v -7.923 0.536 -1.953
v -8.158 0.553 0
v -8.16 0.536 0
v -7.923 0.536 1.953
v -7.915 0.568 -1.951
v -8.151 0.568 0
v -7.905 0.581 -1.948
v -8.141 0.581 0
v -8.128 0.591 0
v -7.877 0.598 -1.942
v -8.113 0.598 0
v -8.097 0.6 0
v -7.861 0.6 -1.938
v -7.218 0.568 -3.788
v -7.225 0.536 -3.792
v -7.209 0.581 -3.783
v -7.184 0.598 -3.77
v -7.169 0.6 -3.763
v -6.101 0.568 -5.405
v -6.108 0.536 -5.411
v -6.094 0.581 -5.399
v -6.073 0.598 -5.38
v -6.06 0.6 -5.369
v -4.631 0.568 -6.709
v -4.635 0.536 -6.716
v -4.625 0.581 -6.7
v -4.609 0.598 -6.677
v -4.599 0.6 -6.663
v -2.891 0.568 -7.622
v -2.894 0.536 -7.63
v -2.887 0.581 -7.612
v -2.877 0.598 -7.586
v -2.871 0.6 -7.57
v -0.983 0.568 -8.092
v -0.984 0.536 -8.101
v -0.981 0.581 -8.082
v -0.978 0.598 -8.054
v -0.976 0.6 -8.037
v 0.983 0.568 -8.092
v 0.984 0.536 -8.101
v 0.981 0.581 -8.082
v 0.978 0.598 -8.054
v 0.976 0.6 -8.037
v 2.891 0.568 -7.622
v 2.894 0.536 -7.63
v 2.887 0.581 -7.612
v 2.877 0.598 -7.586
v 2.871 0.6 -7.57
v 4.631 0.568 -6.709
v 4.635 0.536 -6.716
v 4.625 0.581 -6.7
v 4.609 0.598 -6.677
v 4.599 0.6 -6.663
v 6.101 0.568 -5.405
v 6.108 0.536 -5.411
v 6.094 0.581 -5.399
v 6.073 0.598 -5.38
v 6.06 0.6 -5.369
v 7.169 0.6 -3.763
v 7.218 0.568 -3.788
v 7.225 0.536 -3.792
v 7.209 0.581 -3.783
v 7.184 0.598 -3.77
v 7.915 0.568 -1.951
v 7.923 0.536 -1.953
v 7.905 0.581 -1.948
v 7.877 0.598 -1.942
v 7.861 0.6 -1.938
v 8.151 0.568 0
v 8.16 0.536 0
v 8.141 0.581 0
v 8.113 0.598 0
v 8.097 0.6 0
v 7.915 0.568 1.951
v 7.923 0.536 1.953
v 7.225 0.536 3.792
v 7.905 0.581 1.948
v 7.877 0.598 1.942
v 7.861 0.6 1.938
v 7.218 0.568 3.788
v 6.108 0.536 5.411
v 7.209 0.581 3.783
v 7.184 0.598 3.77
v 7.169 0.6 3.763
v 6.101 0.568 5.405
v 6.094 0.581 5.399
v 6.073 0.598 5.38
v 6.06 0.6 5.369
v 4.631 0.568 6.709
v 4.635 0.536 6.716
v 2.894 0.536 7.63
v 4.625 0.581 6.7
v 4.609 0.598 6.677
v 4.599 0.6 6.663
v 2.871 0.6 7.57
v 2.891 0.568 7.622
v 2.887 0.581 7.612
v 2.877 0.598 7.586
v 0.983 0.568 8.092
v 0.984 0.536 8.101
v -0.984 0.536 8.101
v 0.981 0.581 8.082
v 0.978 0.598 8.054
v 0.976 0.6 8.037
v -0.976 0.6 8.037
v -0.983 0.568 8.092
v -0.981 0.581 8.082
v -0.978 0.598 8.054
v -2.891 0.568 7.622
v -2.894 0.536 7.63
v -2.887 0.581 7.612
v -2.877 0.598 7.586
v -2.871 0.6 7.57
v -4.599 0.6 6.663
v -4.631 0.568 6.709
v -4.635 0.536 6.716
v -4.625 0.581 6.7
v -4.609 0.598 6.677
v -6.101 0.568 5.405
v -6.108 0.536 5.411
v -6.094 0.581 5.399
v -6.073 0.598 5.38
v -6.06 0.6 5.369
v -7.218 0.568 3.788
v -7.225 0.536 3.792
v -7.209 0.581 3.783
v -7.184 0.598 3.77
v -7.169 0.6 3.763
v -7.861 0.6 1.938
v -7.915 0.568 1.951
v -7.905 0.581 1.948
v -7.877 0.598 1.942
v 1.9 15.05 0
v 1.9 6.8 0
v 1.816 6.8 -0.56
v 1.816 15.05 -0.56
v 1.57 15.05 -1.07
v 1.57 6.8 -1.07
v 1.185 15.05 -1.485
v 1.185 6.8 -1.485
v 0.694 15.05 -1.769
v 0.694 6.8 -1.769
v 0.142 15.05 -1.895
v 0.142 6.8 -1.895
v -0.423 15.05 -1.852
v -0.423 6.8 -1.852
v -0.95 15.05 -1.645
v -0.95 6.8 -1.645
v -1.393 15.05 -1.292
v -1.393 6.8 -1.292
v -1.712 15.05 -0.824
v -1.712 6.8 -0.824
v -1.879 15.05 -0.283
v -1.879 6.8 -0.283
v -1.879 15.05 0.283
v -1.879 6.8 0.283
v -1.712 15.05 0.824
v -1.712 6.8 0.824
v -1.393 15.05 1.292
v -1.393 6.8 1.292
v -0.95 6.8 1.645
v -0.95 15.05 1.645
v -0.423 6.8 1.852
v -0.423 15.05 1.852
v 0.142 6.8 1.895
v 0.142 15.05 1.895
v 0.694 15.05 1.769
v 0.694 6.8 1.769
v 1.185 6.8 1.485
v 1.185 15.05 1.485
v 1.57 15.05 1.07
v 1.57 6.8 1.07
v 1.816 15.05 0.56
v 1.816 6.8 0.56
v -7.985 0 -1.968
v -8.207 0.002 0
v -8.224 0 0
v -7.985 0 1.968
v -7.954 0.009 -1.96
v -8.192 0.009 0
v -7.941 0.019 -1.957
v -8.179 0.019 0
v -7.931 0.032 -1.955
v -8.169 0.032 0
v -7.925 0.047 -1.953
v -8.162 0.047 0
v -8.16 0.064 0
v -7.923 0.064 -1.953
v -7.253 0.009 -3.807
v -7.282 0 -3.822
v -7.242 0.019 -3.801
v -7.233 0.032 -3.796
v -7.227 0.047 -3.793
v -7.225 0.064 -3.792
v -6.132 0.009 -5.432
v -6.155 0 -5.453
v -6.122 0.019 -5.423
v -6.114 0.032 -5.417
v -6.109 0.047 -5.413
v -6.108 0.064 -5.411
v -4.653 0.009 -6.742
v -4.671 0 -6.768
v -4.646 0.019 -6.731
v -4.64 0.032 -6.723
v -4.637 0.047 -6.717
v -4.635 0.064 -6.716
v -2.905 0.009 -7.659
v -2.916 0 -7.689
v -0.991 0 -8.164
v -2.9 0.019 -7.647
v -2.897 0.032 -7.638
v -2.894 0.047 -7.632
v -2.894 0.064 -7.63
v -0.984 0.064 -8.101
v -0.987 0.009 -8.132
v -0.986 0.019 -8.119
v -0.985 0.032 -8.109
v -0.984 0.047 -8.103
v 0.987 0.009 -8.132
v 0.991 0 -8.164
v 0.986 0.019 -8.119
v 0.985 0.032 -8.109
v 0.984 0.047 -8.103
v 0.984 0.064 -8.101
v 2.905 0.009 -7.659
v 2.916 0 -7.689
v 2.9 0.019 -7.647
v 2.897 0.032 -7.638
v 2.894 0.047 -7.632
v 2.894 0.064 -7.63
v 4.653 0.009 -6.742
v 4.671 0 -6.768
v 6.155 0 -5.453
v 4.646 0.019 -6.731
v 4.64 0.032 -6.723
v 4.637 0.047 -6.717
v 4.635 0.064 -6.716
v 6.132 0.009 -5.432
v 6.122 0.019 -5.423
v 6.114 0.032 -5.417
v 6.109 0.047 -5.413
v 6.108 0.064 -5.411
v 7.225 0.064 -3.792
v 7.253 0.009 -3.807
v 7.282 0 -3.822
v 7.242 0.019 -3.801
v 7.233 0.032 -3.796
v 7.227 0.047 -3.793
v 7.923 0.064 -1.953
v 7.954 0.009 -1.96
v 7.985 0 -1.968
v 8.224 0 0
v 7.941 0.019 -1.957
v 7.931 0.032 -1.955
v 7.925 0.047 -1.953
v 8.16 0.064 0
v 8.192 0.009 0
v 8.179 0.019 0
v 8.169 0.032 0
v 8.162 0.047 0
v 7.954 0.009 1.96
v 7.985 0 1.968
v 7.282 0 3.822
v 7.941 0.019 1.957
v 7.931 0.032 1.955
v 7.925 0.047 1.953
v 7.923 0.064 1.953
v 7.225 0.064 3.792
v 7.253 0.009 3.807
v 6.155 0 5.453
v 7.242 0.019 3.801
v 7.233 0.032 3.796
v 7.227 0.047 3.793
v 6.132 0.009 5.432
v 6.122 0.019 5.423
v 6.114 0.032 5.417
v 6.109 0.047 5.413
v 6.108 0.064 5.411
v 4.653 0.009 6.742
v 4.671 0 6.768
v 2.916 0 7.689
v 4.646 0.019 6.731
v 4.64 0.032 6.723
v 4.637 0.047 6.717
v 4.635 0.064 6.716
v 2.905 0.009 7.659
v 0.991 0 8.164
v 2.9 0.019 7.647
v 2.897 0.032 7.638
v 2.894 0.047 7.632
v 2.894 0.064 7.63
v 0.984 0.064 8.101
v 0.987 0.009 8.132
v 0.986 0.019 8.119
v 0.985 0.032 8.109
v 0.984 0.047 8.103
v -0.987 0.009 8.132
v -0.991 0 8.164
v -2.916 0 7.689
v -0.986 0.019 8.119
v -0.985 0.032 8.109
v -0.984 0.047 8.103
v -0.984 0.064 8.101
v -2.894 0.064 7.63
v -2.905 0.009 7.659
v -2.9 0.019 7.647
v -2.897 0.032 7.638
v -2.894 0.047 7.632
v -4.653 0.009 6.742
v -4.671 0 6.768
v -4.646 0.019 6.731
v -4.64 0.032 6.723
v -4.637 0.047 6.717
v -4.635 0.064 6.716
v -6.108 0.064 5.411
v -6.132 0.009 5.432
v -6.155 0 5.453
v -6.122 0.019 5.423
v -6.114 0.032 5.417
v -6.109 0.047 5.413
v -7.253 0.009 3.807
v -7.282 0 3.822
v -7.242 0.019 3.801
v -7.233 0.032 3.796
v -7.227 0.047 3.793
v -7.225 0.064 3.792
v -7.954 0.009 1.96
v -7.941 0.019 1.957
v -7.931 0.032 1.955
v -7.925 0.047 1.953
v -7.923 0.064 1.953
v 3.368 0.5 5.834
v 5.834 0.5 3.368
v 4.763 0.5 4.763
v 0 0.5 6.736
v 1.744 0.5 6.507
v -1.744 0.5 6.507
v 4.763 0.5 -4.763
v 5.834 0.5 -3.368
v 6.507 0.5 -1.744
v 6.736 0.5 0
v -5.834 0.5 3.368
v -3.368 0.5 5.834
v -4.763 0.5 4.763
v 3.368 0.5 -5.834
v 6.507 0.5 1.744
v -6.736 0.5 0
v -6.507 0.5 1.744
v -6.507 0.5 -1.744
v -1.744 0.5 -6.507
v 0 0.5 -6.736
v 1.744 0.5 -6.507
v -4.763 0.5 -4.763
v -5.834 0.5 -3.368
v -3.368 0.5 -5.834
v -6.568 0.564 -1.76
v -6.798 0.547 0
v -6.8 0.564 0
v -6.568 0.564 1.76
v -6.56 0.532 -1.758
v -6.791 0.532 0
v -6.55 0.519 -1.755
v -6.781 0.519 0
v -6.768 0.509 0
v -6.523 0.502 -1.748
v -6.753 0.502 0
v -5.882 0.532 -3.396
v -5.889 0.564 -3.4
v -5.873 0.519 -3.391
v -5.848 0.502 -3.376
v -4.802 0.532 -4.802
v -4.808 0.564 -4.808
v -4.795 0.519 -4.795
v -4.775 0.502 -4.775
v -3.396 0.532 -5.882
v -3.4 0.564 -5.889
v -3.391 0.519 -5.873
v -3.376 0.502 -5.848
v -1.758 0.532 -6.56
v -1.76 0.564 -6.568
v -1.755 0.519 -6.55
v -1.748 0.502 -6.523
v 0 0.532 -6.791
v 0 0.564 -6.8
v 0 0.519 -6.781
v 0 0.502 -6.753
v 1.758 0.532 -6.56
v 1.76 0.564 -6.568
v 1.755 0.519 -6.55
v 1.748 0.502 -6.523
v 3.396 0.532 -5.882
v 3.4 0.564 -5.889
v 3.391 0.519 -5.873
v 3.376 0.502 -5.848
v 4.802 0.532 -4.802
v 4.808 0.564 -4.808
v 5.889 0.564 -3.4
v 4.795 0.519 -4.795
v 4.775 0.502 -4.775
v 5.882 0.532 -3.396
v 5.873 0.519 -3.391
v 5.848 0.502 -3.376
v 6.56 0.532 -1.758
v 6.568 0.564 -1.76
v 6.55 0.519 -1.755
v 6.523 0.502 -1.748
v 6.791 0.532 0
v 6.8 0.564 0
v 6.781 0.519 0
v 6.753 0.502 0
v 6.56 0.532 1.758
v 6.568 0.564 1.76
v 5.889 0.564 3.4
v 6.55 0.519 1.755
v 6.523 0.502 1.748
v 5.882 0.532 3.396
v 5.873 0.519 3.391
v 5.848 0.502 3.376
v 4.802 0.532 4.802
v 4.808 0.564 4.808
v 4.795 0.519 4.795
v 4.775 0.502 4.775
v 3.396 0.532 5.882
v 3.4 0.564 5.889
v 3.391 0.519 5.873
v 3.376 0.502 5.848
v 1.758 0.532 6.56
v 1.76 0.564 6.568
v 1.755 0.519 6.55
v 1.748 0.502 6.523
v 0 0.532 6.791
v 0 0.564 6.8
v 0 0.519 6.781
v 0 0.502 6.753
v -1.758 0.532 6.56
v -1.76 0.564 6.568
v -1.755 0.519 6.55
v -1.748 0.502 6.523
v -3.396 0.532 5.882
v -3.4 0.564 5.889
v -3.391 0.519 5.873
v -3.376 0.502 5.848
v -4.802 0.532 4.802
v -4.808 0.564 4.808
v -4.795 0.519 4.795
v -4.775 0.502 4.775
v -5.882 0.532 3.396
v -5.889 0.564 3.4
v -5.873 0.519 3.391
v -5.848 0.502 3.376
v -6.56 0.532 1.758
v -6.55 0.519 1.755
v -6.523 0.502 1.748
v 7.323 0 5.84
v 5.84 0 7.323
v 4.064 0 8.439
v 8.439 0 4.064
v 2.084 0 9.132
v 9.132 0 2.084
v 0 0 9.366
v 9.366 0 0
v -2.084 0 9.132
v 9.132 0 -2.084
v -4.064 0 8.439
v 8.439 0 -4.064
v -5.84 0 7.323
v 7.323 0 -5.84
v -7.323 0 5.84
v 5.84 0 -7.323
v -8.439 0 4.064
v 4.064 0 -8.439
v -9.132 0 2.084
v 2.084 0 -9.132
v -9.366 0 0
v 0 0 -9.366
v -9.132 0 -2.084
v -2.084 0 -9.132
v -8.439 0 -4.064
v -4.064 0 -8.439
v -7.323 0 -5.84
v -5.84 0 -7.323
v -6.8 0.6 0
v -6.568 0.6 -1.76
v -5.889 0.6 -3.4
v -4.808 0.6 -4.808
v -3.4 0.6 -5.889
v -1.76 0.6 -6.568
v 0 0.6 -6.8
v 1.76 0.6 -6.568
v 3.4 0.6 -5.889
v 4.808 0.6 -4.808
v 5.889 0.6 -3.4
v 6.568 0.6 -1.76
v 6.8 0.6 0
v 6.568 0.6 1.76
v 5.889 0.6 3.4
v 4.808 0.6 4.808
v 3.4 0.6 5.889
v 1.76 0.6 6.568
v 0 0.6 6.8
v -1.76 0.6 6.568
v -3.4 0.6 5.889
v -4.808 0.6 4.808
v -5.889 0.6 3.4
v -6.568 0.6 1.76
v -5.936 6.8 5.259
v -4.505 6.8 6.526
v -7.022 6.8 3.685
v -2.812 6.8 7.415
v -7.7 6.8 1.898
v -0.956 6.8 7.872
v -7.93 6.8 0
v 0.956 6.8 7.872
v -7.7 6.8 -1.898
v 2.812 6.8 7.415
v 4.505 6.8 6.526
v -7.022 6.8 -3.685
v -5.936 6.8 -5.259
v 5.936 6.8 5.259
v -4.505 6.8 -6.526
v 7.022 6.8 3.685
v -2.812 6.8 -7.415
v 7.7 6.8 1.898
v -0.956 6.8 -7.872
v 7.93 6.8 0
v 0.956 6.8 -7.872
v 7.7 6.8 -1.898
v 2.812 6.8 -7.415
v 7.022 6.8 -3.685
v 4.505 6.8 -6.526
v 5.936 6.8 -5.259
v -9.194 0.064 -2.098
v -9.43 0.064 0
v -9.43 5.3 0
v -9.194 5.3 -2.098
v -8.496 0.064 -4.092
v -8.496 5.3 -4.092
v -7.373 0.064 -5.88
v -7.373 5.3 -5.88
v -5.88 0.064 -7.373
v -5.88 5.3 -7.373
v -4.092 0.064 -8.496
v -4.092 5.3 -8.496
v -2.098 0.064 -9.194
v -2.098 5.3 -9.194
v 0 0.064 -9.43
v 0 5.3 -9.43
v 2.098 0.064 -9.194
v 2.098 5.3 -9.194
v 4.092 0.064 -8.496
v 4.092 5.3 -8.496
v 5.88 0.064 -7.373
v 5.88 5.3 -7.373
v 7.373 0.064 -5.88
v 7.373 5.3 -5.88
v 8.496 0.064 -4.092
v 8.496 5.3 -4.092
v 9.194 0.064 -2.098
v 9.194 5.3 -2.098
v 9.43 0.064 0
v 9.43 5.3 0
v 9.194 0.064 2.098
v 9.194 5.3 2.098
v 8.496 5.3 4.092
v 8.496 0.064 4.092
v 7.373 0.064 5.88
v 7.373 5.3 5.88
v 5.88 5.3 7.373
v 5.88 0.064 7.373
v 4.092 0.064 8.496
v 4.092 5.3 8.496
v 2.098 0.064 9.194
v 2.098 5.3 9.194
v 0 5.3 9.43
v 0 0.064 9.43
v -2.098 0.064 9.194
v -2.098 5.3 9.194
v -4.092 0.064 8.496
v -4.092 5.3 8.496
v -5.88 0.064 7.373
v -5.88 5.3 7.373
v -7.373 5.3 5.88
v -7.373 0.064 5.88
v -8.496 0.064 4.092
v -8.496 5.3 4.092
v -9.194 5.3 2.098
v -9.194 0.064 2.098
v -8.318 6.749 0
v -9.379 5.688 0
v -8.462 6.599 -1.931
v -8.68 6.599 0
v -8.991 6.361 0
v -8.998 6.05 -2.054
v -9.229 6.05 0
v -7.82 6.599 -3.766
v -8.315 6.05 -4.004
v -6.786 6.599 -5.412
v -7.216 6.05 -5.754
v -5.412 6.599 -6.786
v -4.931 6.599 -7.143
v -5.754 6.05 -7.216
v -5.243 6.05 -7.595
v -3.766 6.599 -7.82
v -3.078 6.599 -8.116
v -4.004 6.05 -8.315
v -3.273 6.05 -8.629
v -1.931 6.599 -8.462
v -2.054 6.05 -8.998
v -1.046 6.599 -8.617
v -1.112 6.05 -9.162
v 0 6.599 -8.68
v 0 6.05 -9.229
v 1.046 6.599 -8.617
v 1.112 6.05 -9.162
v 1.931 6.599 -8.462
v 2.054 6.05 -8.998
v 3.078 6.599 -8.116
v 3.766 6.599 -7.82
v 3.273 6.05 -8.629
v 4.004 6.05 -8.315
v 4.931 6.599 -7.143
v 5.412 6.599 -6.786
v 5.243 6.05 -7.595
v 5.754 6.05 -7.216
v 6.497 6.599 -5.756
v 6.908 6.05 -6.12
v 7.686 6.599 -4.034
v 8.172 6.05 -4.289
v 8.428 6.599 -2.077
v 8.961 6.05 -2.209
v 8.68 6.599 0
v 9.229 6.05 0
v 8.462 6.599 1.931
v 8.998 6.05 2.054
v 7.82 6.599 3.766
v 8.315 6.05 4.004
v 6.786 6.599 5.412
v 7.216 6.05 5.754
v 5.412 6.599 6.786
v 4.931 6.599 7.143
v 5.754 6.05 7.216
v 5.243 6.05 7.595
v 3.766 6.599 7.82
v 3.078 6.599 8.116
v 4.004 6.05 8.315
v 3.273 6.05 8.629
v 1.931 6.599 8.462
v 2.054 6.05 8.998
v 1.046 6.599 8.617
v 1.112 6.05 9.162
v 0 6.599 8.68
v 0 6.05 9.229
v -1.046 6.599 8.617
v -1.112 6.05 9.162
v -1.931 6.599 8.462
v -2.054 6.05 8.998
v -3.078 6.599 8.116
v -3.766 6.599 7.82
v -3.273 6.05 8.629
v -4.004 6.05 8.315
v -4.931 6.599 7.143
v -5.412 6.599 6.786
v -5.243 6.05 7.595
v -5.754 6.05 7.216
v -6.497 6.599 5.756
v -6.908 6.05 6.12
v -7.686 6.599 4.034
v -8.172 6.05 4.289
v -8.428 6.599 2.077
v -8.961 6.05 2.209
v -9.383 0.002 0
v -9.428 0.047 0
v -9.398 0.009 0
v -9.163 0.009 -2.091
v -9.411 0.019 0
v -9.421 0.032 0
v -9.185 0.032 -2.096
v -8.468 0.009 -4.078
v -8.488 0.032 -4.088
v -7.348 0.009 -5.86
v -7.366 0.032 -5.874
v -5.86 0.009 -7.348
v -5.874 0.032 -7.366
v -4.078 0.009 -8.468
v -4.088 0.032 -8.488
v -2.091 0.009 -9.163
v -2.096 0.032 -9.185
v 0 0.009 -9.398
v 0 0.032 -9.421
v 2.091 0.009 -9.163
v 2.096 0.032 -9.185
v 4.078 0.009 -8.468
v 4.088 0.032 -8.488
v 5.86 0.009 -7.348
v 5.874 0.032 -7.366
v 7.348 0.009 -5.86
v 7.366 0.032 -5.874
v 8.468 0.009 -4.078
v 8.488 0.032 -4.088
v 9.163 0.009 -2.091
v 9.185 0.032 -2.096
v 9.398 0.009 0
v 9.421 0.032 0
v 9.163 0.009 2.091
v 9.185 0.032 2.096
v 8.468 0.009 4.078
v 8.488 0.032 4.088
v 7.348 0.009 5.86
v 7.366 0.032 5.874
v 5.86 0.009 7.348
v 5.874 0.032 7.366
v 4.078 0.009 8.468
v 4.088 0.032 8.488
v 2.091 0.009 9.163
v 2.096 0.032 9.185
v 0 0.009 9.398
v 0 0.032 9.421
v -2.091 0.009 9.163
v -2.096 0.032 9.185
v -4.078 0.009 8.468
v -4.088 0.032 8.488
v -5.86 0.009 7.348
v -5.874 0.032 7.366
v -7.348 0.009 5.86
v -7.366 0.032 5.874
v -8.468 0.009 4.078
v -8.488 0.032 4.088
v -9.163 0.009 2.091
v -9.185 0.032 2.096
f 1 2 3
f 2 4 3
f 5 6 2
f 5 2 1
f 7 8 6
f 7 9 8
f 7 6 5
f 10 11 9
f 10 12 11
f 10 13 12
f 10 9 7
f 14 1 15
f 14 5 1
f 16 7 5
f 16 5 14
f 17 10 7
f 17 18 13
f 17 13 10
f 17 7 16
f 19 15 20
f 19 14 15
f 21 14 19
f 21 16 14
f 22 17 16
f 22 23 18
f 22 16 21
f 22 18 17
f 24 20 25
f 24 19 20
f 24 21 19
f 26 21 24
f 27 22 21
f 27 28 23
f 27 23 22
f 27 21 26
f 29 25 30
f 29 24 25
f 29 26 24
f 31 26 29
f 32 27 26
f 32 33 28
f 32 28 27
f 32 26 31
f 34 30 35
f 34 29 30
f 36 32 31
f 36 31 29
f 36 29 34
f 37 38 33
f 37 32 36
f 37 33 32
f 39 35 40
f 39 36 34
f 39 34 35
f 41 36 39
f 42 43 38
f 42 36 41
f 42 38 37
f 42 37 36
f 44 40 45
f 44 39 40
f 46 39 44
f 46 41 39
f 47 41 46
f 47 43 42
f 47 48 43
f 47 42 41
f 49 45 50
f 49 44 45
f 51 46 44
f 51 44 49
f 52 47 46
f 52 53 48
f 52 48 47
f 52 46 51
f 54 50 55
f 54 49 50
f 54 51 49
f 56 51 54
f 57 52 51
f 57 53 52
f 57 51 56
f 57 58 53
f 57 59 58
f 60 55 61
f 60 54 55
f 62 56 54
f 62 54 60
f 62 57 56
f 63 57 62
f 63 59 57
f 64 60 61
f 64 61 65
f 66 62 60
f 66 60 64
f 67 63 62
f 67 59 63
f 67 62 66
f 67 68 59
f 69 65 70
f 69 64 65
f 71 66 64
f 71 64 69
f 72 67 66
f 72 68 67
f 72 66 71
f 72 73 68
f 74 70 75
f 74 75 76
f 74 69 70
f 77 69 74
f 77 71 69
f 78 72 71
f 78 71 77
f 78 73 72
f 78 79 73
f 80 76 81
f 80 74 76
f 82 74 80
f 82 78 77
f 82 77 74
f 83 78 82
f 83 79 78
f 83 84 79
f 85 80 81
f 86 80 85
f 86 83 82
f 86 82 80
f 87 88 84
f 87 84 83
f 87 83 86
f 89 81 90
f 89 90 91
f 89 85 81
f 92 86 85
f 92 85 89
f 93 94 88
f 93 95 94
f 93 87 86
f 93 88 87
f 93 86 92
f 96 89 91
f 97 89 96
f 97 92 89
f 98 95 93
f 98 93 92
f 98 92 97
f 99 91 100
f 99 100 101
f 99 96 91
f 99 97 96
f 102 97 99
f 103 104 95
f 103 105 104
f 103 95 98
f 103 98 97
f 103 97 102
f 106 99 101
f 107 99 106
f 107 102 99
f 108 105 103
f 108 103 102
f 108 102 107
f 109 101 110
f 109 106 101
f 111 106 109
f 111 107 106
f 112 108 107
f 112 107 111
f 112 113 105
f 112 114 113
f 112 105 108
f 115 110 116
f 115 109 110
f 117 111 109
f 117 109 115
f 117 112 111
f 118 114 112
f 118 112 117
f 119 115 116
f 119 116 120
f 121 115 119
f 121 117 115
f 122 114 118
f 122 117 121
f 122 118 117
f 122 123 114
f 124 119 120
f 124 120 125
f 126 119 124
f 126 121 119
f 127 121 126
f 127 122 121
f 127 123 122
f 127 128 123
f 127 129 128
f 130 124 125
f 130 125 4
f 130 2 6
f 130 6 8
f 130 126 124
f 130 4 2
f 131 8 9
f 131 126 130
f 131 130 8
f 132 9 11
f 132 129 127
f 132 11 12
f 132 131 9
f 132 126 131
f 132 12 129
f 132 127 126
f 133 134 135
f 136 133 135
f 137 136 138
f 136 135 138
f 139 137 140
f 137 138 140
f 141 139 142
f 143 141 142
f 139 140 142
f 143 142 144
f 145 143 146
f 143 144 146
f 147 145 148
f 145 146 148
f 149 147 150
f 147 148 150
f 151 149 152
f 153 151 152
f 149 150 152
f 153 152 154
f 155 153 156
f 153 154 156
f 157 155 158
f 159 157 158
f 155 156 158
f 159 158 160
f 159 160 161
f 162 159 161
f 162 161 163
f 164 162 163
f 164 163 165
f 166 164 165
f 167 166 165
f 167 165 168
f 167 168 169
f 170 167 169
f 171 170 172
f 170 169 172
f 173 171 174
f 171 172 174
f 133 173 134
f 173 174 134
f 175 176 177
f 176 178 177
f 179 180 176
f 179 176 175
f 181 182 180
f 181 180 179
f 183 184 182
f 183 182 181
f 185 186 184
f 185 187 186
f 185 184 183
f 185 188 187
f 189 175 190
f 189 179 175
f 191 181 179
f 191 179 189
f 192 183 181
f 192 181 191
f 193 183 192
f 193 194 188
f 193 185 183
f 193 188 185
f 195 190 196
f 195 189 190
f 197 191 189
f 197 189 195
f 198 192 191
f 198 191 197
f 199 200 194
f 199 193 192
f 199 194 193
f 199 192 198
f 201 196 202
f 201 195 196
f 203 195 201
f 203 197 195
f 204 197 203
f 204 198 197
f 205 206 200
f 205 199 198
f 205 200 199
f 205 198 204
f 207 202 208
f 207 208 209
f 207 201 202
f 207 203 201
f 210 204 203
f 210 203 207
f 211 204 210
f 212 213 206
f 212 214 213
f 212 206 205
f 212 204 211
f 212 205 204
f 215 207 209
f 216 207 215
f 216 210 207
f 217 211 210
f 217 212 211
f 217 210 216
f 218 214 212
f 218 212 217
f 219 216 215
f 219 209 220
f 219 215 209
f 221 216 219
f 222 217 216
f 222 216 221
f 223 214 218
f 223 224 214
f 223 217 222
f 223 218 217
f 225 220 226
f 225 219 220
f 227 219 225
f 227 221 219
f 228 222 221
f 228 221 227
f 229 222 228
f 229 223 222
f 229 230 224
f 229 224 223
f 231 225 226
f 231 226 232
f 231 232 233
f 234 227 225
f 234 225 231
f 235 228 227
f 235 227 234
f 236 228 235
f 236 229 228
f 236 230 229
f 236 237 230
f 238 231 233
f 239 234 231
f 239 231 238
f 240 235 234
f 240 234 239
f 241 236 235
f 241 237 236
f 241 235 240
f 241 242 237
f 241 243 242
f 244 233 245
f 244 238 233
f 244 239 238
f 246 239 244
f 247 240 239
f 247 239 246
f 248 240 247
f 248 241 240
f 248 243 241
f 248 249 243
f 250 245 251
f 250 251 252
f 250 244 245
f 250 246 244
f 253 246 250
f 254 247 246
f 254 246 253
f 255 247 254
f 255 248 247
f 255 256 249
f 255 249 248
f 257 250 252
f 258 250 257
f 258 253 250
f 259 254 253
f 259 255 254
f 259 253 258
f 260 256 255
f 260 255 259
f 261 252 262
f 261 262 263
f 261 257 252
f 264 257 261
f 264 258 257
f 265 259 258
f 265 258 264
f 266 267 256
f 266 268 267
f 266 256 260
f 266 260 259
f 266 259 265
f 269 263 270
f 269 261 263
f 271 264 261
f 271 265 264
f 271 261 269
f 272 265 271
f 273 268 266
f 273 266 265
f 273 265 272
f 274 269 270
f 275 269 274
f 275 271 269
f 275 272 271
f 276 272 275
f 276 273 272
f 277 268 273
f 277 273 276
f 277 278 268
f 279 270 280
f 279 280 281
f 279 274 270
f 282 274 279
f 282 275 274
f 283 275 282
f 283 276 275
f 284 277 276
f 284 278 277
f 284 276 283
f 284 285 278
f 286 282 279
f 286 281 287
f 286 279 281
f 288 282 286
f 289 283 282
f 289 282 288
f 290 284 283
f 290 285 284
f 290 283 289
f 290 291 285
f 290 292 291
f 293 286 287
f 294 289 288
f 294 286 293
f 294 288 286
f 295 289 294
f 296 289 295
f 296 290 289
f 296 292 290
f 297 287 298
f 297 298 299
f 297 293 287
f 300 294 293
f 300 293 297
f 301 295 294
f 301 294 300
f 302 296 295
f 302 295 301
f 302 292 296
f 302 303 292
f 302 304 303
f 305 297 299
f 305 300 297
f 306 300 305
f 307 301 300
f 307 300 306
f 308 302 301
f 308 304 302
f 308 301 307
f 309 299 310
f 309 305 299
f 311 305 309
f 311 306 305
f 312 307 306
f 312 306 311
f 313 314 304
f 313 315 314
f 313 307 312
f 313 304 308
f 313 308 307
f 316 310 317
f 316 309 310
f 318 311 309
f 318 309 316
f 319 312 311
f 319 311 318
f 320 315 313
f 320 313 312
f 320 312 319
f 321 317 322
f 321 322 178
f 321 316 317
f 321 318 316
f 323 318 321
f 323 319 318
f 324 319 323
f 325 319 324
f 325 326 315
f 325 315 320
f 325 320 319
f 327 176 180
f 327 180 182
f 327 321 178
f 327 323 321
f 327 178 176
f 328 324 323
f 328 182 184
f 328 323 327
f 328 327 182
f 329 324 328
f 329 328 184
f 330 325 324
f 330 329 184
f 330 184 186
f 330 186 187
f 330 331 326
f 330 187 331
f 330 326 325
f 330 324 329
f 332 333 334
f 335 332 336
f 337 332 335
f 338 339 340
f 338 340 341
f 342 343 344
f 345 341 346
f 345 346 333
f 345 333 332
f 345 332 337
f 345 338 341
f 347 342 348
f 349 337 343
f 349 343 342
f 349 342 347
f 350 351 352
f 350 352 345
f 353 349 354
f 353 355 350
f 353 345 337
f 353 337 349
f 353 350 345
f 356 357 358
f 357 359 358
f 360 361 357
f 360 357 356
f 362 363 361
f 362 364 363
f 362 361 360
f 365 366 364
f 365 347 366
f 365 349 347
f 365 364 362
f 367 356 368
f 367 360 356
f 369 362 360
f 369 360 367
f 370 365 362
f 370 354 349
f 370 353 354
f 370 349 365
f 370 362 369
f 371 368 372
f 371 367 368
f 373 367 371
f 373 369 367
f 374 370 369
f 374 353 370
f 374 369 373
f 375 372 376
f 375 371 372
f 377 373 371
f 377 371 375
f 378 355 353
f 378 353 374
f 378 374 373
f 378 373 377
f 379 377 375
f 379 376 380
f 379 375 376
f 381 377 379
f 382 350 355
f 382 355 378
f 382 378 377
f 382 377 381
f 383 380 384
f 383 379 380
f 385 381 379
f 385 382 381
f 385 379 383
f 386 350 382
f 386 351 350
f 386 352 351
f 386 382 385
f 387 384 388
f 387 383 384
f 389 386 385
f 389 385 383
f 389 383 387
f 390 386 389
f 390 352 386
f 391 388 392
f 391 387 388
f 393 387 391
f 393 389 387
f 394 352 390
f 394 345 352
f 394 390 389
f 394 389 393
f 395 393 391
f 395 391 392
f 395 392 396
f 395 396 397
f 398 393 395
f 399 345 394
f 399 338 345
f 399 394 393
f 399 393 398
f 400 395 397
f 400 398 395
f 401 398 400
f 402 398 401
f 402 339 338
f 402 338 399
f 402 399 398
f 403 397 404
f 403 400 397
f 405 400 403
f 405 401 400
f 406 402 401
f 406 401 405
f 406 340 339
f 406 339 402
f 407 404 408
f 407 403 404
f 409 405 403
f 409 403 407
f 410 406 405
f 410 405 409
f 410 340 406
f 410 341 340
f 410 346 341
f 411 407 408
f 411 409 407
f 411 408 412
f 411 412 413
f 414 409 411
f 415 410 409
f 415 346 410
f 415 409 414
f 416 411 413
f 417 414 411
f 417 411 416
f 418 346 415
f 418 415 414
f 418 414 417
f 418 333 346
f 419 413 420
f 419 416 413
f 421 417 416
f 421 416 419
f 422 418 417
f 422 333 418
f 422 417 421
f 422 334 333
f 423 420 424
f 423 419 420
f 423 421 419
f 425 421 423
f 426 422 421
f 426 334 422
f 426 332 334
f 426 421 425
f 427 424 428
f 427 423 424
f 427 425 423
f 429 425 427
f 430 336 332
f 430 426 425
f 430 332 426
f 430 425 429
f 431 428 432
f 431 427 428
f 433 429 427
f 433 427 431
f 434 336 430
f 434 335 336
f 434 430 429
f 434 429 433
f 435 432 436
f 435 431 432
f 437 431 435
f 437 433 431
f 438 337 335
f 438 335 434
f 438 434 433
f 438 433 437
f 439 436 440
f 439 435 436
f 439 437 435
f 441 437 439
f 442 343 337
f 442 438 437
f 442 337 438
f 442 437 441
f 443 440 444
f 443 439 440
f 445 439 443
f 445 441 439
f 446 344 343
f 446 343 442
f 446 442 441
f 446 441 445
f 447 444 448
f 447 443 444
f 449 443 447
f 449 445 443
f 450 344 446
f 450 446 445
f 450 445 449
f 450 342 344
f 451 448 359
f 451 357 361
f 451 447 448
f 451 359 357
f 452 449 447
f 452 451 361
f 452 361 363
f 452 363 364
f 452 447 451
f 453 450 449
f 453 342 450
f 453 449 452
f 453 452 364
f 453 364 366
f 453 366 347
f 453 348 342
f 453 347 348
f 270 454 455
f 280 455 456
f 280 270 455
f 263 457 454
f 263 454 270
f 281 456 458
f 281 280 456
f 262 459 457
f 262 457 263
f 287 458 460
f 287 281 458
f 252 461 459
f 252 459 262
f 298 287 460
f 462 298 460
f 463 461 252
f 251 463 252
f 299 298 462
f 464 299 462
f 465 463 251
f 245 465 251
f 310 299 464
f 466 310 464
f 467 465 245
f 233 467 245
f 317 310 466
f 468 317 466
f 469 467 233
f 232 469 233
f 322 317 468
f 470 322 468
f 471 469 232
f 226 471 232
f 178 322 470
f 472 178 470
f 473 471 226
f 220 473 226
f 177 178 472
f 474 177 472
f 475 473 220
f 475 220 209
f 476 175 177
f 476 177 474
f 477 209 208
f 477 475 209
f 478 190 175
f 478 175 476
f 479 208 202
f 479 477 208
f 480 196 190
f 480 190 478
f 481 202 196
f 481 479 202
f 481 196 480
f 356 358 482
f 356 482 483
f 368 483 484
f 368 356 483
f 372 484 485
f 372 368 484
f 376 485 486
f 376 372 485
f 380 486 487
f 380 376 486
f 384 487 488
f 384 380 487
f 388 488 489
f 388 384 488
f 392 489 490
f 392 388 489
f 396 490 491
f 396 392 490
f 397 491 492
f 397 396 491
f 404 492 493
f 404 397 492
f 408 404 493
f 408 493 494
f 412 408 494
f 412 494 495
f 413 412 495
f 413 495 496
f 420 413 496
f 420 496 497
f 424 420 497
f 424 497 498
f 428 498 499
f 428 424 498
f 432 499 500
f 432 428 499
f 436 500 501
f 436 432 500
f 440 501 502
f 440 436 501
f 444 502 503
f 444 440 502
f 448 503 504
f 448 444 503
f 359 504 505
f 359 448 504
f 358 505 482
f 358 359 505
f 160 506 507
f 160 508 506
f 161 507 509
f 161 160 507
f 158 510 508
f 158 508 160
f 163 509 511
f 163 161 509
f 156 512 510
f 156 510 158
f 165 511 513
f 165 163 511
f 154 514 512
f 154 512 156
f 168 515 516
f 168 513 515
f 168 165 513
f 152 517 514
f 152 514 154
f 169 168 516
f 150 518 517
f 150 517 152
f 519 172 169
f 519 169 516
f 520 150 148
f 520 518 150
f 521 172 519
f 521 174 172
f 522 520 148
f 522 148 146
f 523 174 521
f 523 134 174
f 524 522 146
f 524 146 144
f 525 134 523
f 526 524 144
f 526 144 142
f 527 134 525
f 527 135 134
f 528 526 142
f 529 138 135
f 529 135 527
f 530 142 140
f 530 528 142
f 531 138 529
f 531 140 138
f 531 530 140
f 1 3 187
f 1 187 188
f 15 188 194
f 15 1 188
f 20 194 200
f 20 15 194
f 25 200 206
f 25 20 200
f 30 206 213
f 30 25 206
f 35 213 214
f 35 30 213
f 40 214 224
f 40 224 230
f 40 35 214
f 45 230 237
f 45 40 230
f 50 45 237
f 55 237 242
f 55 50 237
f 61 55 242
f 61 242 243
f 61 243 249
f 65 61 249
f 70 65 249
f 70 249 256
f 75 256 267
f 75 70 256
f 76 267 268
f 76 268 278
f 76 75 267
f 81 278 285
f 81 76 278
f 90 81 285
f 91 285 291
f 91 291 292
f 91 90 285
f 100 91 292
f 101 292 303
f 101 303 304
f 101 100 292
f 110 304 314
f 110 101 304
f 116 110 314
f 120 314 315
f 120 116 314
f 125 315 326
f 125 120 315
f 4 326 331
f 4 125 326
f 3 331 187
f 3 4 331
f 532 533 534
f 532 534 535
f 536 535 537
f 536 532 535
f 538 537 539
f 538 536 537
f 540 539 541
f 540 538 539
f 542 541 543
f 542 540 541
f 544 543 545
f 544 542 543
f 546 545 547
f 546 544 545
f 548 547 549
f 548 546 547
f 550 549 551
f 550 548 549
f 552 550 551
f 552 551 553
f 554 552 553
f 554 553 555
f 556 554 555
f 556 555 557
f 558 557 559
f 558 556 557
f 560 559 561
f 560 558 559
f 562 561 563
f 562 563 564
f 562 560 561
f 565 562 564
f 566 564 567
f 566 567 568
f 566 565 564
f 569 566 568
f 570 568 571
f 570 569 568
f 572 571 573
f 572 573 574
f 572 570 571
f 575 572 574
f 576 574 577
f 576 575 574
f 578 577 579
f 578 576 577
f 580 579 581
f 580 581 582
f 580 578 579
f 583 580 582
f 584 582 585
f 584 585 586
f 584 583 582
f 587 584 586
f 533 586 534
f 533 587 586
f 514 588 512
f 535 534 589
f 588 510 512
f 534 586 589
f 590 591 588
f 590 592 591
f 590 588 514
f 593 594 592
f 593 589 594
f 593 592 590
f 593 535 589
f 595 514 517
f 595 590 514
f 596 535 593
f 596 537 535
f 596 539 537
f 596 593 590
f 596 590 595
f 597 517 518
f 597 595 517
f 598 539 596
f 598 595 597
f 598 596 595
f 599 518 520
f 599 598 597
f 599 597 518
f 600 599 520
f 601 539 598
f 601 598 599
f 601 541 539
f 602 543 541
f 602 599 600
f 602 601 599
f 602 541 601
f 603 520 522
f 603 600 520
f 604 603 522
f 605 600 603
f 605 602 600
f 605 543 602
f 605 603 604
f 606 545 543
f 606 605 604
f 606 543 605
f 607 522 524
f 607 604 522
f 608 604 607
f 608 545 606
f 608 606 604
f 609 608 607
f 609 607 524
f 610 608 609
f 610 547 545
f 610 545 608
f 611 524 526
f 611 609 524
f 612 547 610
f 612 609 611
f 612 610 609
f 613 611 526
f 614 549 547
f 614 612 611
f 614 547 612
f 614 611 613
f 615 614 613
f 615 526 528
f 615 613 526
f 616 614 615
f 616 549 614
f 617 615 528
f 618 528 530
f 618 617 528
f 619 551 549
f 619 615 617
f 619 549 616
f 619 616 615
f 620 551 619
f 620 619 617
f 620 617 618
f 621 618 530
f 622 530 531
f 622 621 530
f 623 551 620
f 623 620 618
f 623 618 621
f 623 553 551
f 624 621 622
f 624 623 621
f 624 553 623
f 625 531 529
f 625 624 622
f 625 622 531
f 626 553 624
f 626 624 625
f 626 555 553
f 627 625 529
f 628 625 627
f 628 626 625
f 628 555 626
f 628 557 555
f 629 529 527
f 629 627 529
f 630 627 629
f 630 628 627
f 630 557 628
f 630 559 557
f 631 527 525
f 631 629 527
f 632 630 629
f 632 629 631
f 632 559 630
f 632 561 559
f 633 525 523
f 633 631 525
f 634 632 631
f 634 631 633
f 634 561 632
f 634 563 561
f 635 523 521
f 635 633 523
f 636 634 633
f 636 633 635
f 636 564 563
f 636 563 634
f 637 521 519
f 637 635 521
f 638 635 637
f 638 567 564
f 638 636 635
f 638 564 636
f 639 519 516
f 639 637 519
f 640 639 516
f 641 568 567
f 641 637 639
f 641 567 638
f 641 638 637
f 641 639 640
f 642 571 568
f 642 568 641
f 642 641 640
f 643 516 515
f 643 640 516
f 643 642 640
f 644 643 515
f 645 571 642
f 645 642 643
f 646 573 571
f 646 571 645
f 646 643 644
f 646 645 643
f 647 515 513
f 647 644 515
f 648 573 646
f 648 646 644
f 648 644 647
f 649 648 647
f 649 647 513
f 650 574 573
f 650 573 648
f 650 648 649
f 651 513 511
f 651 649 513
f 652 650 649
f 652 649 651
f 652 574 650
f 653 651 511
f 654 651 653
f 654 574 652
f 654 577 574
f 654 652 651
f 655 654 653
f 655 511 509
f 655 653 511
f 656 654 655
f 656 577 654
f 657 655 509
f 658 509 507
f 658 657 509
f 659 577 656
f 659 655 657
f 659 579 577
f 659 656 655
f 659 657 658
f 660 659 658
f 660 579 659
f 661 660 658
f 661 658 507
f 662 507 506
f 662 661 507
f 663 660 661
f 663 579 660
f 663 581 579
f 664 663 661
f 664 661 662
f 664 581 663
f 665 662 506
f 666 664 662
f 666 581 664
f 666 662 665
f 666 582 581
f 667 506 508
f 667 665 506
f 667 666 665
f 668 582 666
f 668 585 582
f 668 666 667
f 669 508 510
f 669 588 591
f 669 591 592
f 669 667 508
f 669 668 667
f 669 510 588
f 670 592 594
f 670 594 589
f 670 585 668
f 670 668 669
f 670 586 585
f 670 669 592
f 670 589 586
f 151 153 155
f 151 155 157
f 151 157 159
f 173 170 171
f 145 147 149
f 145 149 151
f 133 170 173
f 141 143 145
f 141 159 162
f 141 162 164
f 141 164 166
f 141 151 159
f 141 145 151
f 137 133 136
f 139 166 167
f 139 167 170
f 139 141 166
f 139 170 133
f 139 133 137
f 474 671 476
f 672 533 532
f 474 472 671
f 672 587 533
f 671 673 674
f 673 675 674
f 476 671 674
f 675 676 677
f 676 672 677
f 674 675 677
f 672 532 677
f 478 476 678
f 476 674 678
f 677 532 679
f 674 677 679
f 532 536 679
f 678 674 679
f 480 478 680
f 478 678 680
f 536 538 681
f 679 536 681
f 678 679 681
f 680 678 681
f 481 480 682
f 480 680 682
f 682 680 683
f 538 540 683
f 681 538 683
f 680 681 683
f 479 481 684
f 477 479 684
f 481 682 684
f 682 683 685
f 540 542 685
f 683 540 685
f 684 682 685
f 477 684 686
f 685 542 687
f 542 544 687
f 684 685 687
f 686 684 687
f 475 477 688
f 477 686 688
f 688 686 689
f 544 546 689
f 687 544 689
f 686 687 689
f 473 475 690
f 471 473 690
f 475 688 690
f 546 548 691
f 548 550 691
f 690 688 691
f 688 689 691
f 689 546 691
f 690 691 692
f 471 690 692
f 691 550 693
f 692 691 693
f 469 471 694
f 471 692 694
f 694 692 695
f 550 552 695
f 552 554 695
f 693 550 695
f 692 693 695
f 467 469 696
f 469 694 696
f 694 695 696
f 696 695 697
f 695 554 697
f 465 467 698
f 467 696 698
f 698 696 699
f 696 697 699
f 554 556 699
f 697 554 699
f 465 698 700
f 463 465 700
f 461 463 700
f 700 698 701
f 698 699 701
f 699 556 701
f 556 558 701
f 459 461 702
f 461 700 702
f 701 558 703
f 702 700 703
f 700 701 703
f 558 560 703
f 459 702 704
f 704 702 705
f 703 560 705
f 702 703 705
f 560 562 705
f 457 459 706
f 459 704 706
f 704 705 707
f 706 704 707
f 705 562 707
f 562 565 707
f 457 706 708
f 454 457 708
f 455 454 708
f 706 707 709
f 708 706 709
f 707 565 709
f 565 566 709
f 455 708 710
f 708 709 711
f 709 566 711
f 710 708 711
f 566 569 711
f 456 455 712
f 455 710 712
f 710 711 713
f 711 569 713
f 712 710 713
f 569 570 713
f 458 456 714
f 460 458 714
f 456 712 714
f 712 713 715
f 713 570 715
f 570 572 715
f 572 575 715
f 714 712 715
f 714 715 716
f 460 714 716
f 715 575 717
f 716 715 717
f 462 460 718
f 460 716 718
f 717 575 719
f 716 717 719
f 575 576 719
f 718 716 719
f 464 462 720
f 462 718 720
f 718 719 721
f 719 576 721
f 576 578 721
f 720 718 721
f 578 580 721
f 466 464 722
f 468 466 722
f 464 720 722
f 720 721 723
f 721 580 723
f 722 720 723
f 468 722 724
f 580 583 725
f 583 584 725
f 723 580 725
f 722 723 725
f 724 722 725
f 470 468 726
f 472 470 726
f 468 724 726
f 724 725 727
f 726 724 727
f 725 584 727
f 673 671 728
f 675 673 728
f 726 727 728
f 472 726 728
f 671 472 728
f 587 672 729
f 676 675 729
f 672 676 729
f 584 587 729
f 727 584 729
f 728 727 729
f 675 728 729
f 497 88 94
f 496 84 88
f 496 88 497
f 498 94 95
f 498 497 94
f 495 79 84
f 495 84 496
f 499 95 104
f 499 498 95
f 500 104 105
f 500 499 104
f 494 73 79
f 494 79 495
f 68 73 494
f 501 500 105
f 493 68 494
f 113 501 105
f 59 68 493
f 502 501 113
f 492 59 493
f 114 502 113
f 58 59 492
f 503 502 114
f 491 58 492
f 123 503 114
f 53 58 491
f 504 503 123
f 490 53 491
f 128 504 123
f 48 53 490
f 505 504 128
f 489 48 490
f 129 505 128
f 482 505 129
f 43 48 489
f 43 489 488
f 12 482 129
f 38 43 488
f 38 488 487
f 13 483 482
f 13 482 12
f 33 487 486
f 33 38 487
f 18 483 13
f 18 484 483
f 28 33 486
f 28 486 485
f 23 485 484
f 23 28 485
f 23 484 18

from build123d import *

# Parameters (mm, degrees)
SKETCH2_R           = 1.9
BOSS_EXTRUDE1_DEPTH = 8.25
FILLET1_R           = 0.0635


with BuildPart() as part:
    # Sketch1 → Revolve1 (revolve)
    with BuildSketch(Plane.XY):
        with BuildLine():
            Line((-9.43, 0), (-8.16, 0))
            Line((-8.16, 0), (-8.16, 0.6))
            Line((-8.16, 0.6), (-6.8, 0.6))
            Line((-6.8, 0.6), (-6.8, 0.5))
            Line((-6.8, 0.5), (0, 0.5))
            Line((0, 0.5), (0, 6.8))
            Line((0, 6.8), (-7.93, 6.8))
            ThreePointArc((-7.93, 6.8), (-8.990660172, 6.360660172), (-9.43, 5.3))
            Line((-9.43, 5.3), (-9.43, 0))
        make_face()
    revolve(axis=Axis((0, 6.8, 0), (0, -1, 0)))

    # Sketch2 → Boss-Extrude1 (add)
    with BuildSketch(Plane(origin=(0, 6.8, 0), x_dir=(1, 0, 0), z_dir=(0, 1, 0))):
        Circle(SKETCH2_R)
    extrude(amount=BOSS_EXTRUDE1_DEPTH)

    # Fillet1
    fillet1_edges = [part.edges().sort_by_distance(p)[0] for p in [
        (8.16, 0.6, 0),
        (8.16, 0, 0),
        (9.43, 0, 0),
        (6.8, 0.5, 0),
    ]]
    fillet(fillet1_edges, radius=FILLET1_R)


solid = part.part
